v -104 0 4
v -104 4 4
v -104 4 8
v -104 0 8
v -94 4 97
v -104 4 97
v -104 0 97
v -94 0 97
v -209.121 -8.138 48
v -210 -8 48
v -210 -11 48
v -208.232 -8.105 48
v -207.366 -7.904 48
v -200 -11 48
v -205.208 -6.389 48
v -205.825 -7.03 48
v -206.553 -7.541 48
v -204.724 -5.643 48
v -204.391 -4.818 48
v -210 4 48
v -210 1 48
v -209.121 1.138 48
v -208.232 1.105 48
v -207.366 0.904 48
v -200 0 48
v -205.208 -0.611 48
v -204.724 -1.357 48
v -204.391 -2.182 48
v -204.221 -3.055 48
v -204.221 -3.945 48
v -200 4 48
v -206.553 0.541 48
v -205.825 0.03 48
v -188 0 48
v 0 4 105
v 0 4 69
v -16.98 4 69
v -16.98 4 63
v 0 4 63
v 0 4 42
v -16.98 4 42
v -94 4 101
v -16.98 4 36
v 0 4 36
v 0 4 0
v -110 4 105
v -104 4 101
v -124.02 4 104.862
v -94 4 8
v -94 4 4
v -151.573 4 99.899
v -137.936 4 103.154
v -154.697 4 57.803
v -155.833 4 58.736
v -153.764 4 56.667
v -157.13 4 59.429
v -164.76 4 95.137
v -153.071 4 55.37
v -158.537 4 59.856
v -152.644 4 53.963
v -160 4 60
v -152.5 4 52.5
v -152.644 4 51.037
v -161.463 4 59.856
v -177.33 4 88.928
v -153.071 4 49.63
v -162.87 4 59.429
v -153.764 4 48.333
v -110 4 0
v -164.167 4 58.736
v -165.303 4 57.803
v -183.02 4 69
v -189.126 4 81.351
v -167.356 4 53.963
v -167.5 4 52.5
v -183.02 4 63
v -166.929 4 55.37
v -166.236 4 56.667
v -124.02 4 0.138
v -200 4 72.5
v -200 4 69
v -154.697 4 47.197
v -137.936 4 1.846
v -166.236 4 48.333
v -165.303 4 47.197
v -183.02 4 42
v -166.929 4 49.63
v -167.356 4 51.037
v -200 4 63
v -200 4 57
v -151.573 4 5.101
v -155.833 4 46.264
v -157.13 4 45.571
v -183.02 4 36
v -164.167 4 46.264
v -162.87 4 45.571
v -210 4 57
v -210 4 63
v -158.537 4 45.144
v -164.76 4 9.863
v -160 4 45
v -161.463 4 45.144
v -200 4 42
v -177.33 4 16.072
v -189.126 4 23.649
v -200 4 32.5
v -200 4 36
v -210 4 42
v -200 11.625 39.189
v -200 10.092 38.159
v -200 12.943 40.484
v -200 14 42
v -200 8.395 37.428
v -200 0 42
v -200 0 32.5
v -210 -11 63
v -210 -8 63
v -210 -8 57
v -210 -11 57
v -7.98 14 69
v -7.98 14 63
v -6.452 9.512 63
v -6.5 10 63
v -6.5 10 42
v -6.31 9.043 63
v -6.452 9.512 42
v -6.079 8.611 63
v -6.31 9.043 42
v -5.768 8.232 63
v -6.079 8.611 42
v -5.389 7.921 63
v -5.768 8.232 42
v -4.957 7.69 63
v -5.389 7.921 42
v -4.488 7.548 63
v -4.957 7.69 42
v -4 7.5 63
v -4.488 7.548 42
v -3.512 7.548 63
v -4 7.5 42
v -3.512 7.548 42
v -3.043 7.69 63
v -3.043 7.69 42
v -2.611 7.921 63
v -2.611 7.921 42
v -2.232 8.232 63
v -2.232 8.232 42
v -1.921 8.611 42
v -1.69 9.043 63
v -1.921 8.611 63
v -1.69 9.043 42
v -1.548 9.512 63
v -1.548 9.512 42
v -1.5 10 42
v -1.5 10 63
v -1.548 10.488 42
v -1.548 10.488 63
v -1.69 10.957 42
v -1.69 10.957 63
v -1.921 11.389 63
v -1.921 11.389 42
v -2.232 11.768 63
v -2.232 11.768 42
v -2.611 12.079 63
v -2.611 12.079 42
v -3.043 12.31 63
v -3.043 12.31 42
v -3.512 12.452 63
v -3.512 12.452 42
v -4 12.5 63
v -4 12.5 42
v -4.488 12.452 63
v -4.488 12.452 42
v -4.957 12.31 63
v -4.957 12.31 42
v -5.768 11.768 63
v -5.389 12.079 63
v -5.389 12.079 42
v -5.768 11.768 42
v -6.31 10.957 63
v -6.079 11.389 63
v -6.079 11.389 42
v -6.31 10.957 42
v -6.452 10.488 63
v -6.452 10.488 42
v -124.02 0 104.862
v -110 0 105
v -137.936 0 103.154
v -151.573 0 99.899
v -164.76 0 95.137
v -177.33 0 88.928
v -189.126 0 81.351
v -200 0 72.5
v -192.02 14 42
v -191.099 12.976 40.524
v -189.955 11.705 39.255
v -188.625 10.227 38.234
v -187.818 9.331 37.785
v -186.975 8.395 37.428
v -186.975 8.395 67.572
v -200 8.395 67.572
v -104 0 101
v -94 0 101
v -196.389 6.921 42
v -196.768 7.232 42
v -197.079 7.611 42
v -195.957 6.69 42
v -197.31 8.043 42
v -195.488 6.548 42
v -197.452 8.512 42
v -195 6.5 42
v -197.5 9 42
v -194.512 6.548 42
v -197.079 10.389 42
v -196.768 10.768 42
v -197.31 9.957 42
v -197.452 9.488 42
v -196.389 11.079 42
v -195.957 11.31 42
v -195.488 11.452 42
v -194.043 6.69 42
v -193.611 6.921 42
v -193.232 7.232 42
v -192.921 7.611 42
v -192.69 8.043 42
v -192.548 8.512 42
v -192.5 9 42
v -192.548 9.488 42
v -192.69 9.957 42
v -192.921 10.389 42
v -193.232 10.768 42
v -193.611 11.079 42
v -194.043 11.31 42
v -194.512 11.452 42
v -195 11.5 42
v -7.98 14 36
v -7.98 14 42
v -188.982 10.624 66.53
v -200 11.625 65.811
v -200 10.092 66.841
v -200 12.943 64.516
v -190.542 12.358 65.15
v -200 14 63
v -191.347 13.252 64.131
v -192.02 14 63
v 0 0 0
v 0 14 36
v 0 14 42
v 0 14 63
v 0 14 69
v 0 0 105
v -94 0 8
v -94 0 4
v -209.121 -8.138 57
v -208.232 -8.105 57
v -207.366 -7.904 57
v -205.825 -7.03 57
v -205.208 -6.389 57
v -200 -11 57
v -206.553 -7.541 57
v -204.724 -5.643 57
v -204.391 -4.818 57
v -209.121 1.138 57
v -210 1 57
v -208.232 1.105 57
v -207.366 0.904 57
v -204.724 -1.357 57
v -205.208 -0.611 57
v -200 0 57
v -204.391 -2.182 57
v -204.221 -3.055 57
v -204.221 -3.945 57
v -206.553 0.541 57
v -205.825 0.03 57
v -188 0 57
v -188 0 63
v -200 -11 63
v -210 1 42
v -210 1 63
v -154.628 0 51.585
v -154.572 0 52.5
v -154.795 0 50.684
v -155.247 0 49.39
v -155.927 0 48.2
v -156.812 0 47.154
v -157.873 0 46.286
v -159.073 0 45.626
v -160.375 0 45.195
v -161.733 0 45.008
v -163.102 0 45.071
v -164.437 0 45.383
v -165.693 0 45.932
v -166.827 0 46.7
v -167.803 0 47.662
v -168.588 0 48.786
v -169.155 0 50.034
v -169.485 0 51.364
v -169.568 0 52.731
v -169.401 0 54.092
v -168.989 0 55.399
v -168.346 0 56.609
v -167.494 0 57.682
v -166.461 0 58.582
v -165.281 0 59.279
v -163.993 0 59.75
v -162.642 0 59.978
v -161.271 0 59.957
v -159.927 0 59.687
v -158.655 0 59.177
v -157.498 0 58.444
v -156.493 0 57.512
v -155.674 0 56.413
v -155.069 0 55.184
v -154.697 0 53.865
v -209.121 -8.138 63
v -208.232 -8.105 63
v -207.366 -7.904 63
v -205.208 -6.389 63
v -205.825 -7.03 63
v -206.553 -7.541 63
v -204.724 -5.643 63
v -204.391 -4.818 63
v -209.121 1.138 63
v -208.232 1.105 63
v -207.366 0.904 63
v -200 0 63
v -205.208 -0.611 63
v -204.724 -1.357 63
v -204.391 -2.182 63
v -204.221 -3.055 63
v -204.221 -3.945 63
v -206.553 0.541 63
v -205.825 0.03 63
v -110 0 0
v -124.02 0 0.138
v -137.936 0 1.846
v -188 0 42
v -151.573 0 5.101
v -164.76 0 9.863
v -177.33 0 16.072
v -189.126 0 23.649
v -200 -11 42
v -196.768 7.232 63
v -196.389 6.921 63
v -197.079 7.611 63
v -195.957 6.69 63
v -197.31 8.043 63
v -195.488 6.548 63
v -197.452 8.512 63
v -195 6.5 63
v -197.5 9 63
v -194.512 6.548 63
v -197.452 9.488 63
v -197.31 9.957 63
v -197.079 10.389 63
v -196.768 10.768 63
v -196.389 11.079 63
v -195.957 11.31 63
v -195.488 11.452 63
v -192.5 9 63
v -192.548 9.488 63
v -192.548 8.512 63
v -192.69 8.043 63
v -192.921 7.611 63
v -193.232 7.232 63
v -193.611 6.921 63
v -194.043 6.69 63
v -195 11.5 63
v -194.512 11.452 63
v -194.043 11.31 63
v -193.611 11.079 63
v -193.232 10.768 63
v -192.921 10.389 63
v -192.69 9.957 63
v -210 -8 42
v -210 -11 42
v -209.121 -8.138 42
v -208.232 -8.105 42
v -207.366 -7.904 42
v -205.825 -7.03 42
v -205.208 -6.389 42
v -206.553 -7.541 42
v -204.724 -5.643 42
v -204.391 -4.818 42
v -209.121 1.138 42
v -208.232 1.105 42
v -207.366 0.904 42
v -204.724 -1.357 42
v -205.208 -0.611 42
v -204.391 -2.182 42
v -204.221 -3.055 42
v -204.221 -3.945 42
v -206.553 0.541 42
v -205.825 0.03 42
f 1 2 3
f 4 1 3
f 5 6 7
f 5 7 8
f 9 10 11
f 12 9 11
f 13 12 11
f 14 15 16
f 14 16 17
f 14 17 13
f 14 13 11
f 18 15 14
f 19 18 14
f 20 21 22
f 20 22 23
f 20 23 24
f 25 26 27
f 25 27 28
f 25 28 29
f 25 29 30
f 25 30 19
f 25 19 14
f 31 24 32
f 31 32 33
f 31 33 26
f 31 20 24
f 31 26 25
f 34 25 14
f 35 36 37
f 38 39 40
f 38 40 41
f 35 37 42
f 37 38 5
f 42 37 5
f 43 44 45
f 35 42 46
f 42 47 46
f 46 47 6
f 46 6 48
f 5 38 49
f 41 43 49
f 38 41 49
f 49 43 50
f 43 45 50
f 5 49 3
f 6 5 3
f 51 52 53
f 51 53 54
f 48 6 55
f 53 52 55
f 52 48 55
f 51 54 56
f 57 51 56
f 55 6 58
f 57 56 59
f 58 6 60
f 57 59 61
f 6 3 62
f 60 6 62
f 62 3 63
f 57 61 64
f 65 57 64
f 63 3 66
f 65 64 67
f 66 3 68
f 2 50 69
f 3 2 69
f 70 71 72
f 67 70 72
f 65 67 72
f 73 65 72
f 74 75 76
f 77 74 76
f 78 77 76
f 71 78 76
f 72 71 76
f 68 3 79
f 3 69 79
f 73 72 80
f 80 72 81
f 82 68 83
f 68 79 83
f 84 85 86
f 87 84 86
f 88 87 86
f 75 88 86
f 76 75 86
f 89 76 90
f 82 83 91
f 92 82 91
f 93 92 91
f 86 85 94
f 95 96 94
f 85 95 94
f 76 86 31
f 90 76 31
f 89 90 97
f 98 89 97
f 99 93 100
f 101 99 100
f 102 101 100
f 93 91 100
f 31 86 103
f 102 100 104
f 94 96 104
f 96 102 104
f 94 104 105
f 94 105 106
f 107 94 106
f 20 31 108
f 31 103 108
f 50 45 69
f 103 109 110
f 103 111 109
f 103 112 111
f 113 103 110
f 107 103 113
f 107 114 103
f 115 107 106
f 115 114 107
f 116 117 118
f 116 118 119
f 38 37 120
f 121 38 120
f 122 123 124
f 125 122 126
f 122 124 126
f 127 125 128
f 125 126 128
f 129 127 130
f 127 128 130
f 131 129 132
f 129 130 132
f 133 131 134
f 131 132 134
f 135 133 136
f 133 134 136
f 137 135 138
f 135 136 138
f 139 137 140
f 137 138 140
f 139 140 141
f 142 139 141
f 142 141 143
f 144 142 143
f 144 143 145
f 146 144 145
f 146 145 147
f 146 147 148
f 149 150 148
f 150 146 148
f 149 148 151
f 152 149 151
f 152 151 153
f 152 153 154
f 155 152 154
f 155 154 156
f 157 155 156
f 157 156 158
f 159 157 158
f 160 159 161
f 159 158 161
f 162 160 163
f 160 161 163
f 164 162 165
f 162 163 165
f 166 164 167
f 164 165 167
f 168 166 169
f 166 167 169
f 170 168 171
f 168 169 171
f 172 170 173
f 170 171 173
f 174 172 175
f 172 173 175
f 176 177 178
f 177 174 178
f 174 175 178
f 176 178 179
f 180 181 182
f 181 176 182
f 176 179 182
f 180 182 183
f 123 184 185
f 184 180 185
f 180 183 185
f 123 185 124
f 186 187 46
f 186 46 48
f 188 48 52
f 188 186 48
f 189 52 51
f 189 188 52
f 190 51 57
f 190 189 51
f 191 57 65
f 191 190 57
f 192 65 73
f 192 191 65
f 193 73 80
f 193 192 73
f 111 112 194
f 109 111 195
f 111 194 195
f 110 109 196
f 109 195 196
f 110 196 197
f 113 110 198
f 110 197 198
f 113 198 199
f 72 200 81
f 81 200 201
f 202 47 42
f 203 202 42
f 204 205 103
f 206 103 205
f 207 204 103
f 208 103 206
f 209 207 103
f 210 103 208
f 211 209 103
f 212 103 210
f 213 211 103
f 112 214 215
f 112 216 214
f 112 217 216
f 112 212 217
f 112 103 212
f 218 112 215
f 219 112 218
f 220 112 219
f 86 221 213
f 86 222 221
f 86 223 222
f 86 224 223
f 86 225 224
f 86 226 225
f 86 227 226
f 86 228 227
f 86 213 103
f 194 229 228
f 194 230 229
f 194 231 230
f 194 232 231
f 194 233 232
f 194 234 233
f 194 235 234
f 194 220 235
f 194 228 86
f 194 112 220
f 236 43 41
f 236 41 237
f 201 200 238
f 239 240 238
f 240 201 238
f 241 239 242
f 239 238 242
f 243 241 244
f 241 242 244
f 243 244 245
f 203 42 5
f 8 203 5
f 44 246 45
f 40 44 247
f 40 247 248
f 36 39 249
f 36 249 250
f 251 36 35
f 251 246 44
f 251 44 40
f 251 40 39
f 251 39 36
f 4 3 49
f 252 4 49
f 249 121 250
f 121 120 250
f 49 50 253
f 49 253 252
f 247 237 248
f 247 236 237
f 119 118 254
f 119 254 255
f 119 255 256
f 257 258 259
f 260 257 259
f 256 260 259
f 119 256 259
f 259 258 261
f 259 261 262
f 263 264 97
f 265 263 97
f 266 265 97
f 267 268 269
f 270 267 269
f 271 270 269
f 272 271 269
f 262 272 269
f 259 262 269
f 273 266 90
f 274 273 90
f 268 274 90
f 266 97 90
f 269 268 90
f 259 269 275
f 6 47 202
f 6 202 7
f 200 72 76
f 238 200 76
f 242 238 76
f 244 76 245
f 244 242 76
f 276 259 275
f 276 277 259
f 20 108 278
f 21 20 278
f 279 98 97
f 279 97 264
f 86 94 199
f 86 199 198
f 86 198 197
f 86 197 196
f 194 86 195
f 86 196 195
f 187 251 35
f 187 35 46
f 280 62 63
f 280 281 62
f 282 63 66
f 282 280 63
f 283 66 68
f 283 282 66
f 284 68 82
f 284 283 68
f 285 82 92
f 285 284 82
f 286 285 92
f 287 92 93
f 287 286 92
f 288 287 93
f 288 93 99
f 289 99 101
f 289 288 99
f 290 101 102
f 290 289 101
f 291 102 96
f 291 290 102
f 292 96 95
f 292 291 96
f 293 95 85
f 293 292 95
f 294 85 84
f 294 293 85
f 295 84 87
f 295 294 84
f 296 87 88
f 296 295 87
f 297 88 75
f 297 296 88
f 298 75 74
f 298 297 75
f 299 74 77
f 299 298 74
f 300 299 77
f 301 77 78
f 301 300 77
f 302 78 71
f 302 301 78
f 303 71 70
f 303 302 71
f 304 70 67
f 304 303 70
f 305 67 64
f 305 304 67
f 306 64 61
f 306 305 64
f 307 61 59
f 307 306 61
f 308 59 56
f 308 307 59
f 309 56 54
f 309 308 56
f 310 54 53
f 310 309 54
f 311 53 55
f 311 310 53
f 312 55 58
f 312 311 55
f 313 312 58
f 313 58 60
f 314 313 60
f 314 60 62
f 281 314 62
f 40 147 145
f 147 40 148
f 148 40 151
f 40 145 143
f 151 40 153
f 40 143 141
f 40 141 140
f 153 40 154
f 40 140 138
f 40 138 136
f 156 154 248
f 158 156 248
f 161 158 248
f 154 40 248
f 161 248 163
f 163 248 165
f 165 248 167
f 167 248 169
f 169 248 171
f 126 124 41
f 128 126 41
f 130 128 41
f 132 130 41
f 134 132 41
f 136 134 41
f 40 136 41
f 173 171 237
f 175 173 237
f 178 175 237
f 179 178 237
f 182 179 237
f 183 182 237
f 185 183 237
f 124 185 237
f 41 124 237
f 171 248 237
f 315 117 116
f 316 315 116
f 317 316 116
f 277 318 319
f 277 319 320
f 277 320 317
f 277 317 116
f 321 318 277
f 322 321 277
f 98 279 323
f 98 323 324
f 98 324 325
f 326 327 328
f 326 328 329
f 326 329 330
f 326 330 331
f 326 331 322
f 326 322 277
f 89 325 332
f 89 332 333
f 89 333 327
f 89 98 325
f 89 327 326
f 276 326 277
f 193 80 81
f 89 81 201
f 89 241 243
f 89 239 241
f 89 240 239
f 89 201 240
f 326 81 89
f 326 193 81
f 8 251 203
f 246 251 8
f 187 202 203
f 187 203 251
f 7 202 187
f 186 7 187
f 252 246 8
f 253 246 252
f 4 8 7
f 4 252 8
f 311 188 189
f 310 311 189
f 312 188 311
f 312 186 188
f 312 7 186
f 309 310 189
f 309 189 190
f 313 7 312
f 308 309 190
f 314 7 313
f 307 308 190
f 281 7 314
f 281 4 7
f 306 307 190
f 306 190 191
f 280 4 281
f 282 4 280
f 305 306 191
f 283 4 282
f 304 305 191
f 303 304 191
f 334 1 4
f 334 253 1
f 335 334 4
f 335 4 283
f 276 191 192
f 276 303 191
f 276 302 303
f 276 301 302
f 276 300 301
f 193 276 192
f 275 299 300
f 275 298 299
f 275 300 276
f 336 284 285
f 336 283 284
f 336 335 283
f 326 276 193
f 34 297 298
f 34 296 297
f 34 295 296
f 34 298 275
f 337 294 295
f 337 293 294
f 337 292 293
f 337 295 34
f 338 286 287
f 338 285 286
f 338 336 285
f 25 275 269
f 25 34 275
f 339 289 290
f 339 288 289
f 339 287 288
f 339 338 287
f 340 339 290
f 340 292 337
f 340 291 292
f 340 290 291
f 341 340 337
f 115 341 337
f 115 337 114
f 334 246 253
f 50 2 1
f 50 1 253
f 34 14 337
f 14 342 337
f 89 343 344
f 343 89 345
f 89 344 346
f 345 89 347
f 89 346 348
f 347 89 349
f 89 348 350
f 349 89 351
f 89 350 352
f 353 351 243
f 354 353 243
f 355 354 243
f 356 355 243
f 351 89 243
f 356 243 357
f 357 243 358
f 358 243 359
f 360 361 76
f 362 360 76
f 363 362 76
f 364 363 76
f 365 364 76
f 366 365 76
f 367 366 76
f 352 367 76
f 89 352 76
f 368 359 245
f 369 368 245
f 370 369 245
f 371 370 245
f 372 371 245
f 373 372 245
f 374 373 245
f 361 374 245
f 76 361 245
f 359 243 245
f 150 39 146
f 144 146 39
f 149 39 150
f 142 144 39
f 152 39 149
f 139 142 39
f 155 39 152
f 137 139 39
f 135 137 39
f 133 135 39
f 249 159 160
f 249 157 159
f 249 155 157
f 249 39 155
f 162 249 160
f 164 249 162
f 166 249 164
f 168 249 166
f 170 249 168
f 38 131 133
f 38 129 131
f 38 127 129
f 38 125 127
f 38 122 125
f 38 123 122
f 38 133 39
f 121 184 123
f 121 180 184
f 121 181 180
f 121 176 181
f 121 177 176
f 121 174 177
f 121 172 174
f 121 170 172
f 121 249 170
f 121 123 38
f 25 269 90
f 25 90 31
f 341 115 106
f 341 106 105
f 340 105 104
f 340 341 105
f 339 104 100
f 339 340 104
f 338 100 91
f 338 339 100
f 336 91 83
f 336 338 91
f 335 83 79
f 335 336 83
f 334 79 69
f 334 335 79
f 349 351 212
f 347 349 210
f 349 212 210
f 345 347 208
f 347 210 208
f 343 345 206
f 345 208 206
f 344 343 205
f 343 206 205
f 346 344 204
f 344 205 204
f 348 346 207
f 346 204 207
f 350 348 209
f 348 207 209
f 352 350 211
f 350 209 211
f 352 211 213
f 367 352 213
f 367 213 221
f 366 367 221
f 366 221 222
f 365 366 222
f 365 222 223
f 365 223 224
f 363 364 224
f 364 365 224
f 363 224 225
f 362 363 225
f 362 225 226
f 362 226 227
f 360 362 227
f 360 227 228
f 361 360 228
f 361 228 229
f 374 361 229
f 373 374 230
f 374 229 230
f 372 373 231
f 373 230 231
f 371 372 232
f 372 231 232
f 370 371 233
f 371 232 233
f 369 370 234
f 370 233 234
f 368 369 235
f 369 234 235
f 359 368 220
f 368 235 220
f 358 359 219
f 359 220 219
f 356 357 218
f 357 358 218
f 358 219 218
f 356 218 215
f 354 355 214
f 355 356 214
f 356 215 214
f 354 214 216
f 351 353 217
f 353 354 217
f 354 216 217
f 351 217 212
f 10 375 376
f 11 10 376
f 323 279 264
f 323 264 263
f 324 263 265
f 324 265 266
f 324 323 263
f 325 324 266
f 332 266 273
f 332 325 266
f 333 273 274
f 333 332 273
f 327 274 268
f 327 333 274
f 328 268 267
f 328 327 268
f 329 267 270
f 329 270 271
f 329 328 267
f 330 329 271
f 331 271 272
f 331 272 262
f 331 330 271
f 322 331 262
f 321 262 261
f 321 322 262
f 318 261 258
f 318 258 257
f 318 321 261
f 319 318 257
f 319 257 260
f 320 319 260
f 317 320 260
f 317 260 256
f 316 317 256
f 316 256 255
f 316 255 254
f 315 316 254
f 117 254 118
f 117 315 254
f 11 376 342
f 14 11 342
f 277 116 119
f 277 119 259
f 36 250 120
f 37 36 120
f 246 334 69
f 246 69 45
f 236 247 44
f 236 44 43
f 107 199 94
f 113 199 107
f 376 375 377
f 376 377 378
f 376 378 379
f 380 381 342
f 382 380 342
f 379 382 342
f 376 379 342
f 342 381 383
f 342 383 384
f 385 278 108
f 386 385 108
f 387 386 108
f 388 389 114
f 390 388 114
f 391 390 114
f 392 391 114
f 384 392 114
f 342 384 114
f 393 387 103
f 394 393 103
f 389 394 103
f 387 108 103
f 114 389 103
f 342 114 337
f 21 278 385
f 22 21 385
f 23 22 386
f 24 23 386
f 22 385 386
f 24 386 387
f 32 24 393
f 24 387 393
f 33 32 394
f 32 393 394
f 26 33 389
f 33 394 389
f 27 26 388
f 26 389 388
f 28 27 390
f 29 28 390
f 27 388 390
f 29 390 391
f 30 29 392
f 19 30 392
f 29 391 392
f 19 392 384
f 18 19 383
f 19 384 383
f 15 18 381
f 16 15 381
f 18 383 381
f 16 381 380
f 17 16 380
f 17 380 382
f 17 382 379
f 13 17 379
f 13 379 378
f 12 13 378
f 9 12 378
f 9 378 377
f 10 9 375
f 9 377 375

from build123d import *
from OCP.BRepFilletAPI import BRepFilletAPI_MakeChamfer

# Parameters (mm, degrees)
BOSS_EXTRUDE1_DEPTH  = 4
BOSS_EXTRUDE2_START  = -45
BOSS_EXTRUDE2_DEPTH  = 3
BOSS_EXTRUDE3_START  = -39
BOSS_EXTRUDE3_DEPTH  = 3
BOSS_EXTRUDE4_REACH  = 221.731
SKETCH6_R            = 2.5
SKETCH7_W            = 10
SKETCH7_H            = 4
CUT_EXTRUDE1_DEPTH   = 10
SKETCH8_R            = 7.5
MIRROR6_START        = -39
MIRROR6_COPY_1_DEPTH = 3
CHAMFER1_SIZE        = 10
CHAMFER1_SIZE_2      = 3.249196962
FILLET1_R            = 10
SKETCH10_R           = 2.5
BOSS_EXTRUDE6_DEPTH  = 23


# Some blends are built 0.0001 mm under size
with BuildPart() as part:
    # Sketch1 → Boss-Extrude1 (new body)
    with BuildSketch(Plane(origin=(0, 0, 0), x_dir=(1, 0, 0), z_dir=(0, 1, 0))):
        with BuildLine():
            Line((-110, 0), (0, 0))
            Line((0, 0), (0, -105))
            Line((0, -105), (-110, -105))
            ThreePointArc((-110, -105), (-158.232963684, -97.702822508), (-200, -72.5))
            Line((-200, -72.5), (-200, -32.5))
            ThreePointArc((-200, -32.5), (-158.232963684, -7.297177492), (-110, 0))
        make_face()
    extrude(amount=BOSS_EXTRUDE1_DEPTH)

    # Sketch2 → Boss-Extrude2 (add, symmetric)
    with BuildSketch(Plane.XY.offset(105).offset(BOSS_EXTRUDE2_START)):
        with BuildLine():
            Line((-200, 4), (-210, 4))
            Line((-210, 4), (-210, 1))
            ThreePointArc((-210, 1), (-204.2, -3.5), (-210, -8))
            Line((-210, -8), (-210, -11))
            Line((-210, -11), (-200, -11))
            Line((-200, -11), (-188, 0))
            Line((-188, 0), (-200, 4))
        make_face()
    boss_extrude2 = extrude(amount=BOSS_EXTRUDE2_DEPTH, both=True)

    # Mirror1: Boss-Extrude2 across plane
    add(boss_extrude2.mirror(Plane.XY.offset(52.5)))

    # Sketch5 → Boss-Extrude3 (add, symmetric)
    with BuildSketch(Plane.XY.offset(105).offset(BOSS_EXTRUDE3_START)):
        Polygon((-16.979807258, 4), (-7.979807258, 14), (0, 14), (0, 4), align=None)
    boss_extrude3 = extrude(amount=BOSS_EXTRUDE3_DEPTH, both=True)

    # Mirror4: Boss-Extrude3 across plane
    add(boss_extrude3.mirror(Plane.XY.offset(52.5)))

    # Sketch6 → Boss-Extrude4 (add, up to next)
    with BuildSketch(Plane.XY.offset(42), mode=Mode.PRIVATE) as boss_extrude4_sk1:
        with Locations(Location((-4, 10, 0), (0, 0, 180))):
            Circle(SKETCH6_R)
    boss_extrude4_tool1 = extrude(boss_extrude4_sk1.sketch, amount=BOSS_EXTRUDE4_REACH, mode=Mode.PRIVATE) - part.part
    add(boss_extrude4_tool1.solids().sort_by_distance((-4, 10, 42))[0])

    # Sketch7 → Cut-Extrude1 (cut)
    with BuildSketch(Plane(origin=(0, 4, 0), x_dir=(1, 0, 0), z_dir=(0, 1, 0))):
        with Locations((-99, -99)):
            Rectangle(SKETCH7_W, SKETCH7_H)
    cut_extrude1 = extrude(amount=-CUT_EXTRUDE1_DEPTH, mode=Mode.SUBTRACT)

    # Mirror5: Cut-Extrude1 across plane
    add(cut_extrude1.mirror(Plane.XY.offset(52.5)), mode=Mode.SUBTRACT)

    # Cut-Sweep1: sweep along a path in Sketch9
    with BuildLine(Plane.XY.offset(52.5)) as cut_sweep1_path:
        Line((-160, 4), (-163.867437875, -3.466183031))
    # Sketch8 → Cut-Sweep1 (sweep, cut)
    with BuildSketch(Plane(origin=(0, 4, 0), x_dir=(1, 0, 0), z_dir=(0, 1, 0))):
        with Locations((-160, -52.5)):
            Circle(SKETCH8_R)
    sweep(path=cut_sweep1_path.line, mode=Mode.SUBTRACT)

    # Mirror6: Boss-Extrude3 across plane
    add(boss_extrude3.mirror(Plane(origin=(-100, 0, 0), x_dir=(0, 0, 1), z_dir=(1, 0, 0))))

    # Mirror6 copy 1 sketch → Mirror6 copy 1 (add, symmetric)
    with BuildSketch(Plane(origin=(-200, 0, 0), x_dir=(-1, 0, 0), z_dir=(0, 0, -1)).offset(MIRROR6_START)):
        Polygon((-16.979807258, 4), (-7.979807258, 14), (0, 14), (0, 4), align=None)
    extrude(amount=MIRROR6_COPY_1_DEPTH, both=True)

    # Chamfer1
    chamfer1_edges_1 = [part.edges().sort_by_distance(p)[0] for p in [
        (-196.010096371, 14, 69),
    ]]
    chamfer1_side_1 = [part.faces().sort_by_distance(p)[0] for p in [
        (-196.010096371, 13.935016061, 69),
    ]]
    chamfer1_edges_2 = [part.edges().sort_by_distance(p)[0] for p in [
        (-196.010096371, 14, 36),
    ]]
    chamfer1_side_2 = [part.faces().sort_by_distance(p)[0] for p in [
        (-196.010096371, 13.935016061, 36),
    ]]
    chamfer1 = BRepFilletAPI_MakeChamfer(part.part.solid().wrapped)
    for e in chamfer1_edges_1:
        chamfer1.Add(CHAMFER1_SIZE - 0.0001, CHAMFER1_SIZE_2 - 0.0001, e.wrapped, chamfer1_side_1[0].wrapped)
    for e in chamfer1_edges_2:
        chamfer1.Add(CHAMFER1_SIZE - 0.0001, CHAMFER1_SIZE_2 - 0.0001, e.wrapped, chamfer1_side_2[0].wrapped)
    add(Compound.cast(chamfer1.Shape()), mode=Mode.REPLACE)  # a hair under: the kernel refuses the full size

    # Fillet1
    # the kernel refuses this fillet: 10 mm, written as the material it takes off along each edge
    with BuildSketch(Plane(origin=(-177.285530003, 14, 39.249096962), x_dir=(0, 0, 1), z_dir=(-1, 0, 0))) as fillet1_piece_1:
        with BuildLine():
            CenterArc((7.689313783, -8.695521796), FILLET1_R, 119.593358477, 42.406991386)
            Line((-1.821270249, -5.605409927), (-2.01148193, -5.543607689))
            Line((-2.01148193, -5.543607689), (-0.190211681, 0.061802237))
            Line((-0.190211681, 0.061802237), (0, 0.2))
            ThreePointArc((0, 0.2), (1.375451519, 0.2), (2.652134823, 0.173910436))
            Line((2.652134823, 0.173910436), (2.750903038, 0))
        make_face()
    extrude(amount=37.449132737, mode=Mode.SUBTRACT)
    with BuildSketch(Plane(origin=(-177.285530003, 14, 65.750903038), x_dir=(0, 0, -1), z_dir=(-1, 0, 0))) as fillet1_piece_2:
        with BuildLine():
            CenterArc((7.689313783, 8.695521796), FILLET1_R, 197.999650137, 42.406991386)
            Line((-1.821270249, 5.605409927), (-2.01148193, 5.543607689))
            Line((-2.01148193, 5.543607689), (-0.190211681, -0.061802237))
            Line((-0.190211681, -0.061802237), (0, -0.2))
            ThreePointArc((0, -0.2), (1.375451519, -0.2), (2.652134823, -0.173910436))
            Line((2.652134823, -0.173910436), (2.750903038, 0))
        make_face()
    extrude(amount=37.449132737, mode=Mode.SUBTRACT)

    # Sketch10 → Boss-Extrude6 (add)
    with BuildSketch(Plane.XY.offset(42)):
        with Locations(Location((-195, 9, 0), (0, 0, 180))):
            Circle(SKETCH10_R)
    extrude(amount=BOSS_EXTRUDE6_DEPTH)


solid = part.part
